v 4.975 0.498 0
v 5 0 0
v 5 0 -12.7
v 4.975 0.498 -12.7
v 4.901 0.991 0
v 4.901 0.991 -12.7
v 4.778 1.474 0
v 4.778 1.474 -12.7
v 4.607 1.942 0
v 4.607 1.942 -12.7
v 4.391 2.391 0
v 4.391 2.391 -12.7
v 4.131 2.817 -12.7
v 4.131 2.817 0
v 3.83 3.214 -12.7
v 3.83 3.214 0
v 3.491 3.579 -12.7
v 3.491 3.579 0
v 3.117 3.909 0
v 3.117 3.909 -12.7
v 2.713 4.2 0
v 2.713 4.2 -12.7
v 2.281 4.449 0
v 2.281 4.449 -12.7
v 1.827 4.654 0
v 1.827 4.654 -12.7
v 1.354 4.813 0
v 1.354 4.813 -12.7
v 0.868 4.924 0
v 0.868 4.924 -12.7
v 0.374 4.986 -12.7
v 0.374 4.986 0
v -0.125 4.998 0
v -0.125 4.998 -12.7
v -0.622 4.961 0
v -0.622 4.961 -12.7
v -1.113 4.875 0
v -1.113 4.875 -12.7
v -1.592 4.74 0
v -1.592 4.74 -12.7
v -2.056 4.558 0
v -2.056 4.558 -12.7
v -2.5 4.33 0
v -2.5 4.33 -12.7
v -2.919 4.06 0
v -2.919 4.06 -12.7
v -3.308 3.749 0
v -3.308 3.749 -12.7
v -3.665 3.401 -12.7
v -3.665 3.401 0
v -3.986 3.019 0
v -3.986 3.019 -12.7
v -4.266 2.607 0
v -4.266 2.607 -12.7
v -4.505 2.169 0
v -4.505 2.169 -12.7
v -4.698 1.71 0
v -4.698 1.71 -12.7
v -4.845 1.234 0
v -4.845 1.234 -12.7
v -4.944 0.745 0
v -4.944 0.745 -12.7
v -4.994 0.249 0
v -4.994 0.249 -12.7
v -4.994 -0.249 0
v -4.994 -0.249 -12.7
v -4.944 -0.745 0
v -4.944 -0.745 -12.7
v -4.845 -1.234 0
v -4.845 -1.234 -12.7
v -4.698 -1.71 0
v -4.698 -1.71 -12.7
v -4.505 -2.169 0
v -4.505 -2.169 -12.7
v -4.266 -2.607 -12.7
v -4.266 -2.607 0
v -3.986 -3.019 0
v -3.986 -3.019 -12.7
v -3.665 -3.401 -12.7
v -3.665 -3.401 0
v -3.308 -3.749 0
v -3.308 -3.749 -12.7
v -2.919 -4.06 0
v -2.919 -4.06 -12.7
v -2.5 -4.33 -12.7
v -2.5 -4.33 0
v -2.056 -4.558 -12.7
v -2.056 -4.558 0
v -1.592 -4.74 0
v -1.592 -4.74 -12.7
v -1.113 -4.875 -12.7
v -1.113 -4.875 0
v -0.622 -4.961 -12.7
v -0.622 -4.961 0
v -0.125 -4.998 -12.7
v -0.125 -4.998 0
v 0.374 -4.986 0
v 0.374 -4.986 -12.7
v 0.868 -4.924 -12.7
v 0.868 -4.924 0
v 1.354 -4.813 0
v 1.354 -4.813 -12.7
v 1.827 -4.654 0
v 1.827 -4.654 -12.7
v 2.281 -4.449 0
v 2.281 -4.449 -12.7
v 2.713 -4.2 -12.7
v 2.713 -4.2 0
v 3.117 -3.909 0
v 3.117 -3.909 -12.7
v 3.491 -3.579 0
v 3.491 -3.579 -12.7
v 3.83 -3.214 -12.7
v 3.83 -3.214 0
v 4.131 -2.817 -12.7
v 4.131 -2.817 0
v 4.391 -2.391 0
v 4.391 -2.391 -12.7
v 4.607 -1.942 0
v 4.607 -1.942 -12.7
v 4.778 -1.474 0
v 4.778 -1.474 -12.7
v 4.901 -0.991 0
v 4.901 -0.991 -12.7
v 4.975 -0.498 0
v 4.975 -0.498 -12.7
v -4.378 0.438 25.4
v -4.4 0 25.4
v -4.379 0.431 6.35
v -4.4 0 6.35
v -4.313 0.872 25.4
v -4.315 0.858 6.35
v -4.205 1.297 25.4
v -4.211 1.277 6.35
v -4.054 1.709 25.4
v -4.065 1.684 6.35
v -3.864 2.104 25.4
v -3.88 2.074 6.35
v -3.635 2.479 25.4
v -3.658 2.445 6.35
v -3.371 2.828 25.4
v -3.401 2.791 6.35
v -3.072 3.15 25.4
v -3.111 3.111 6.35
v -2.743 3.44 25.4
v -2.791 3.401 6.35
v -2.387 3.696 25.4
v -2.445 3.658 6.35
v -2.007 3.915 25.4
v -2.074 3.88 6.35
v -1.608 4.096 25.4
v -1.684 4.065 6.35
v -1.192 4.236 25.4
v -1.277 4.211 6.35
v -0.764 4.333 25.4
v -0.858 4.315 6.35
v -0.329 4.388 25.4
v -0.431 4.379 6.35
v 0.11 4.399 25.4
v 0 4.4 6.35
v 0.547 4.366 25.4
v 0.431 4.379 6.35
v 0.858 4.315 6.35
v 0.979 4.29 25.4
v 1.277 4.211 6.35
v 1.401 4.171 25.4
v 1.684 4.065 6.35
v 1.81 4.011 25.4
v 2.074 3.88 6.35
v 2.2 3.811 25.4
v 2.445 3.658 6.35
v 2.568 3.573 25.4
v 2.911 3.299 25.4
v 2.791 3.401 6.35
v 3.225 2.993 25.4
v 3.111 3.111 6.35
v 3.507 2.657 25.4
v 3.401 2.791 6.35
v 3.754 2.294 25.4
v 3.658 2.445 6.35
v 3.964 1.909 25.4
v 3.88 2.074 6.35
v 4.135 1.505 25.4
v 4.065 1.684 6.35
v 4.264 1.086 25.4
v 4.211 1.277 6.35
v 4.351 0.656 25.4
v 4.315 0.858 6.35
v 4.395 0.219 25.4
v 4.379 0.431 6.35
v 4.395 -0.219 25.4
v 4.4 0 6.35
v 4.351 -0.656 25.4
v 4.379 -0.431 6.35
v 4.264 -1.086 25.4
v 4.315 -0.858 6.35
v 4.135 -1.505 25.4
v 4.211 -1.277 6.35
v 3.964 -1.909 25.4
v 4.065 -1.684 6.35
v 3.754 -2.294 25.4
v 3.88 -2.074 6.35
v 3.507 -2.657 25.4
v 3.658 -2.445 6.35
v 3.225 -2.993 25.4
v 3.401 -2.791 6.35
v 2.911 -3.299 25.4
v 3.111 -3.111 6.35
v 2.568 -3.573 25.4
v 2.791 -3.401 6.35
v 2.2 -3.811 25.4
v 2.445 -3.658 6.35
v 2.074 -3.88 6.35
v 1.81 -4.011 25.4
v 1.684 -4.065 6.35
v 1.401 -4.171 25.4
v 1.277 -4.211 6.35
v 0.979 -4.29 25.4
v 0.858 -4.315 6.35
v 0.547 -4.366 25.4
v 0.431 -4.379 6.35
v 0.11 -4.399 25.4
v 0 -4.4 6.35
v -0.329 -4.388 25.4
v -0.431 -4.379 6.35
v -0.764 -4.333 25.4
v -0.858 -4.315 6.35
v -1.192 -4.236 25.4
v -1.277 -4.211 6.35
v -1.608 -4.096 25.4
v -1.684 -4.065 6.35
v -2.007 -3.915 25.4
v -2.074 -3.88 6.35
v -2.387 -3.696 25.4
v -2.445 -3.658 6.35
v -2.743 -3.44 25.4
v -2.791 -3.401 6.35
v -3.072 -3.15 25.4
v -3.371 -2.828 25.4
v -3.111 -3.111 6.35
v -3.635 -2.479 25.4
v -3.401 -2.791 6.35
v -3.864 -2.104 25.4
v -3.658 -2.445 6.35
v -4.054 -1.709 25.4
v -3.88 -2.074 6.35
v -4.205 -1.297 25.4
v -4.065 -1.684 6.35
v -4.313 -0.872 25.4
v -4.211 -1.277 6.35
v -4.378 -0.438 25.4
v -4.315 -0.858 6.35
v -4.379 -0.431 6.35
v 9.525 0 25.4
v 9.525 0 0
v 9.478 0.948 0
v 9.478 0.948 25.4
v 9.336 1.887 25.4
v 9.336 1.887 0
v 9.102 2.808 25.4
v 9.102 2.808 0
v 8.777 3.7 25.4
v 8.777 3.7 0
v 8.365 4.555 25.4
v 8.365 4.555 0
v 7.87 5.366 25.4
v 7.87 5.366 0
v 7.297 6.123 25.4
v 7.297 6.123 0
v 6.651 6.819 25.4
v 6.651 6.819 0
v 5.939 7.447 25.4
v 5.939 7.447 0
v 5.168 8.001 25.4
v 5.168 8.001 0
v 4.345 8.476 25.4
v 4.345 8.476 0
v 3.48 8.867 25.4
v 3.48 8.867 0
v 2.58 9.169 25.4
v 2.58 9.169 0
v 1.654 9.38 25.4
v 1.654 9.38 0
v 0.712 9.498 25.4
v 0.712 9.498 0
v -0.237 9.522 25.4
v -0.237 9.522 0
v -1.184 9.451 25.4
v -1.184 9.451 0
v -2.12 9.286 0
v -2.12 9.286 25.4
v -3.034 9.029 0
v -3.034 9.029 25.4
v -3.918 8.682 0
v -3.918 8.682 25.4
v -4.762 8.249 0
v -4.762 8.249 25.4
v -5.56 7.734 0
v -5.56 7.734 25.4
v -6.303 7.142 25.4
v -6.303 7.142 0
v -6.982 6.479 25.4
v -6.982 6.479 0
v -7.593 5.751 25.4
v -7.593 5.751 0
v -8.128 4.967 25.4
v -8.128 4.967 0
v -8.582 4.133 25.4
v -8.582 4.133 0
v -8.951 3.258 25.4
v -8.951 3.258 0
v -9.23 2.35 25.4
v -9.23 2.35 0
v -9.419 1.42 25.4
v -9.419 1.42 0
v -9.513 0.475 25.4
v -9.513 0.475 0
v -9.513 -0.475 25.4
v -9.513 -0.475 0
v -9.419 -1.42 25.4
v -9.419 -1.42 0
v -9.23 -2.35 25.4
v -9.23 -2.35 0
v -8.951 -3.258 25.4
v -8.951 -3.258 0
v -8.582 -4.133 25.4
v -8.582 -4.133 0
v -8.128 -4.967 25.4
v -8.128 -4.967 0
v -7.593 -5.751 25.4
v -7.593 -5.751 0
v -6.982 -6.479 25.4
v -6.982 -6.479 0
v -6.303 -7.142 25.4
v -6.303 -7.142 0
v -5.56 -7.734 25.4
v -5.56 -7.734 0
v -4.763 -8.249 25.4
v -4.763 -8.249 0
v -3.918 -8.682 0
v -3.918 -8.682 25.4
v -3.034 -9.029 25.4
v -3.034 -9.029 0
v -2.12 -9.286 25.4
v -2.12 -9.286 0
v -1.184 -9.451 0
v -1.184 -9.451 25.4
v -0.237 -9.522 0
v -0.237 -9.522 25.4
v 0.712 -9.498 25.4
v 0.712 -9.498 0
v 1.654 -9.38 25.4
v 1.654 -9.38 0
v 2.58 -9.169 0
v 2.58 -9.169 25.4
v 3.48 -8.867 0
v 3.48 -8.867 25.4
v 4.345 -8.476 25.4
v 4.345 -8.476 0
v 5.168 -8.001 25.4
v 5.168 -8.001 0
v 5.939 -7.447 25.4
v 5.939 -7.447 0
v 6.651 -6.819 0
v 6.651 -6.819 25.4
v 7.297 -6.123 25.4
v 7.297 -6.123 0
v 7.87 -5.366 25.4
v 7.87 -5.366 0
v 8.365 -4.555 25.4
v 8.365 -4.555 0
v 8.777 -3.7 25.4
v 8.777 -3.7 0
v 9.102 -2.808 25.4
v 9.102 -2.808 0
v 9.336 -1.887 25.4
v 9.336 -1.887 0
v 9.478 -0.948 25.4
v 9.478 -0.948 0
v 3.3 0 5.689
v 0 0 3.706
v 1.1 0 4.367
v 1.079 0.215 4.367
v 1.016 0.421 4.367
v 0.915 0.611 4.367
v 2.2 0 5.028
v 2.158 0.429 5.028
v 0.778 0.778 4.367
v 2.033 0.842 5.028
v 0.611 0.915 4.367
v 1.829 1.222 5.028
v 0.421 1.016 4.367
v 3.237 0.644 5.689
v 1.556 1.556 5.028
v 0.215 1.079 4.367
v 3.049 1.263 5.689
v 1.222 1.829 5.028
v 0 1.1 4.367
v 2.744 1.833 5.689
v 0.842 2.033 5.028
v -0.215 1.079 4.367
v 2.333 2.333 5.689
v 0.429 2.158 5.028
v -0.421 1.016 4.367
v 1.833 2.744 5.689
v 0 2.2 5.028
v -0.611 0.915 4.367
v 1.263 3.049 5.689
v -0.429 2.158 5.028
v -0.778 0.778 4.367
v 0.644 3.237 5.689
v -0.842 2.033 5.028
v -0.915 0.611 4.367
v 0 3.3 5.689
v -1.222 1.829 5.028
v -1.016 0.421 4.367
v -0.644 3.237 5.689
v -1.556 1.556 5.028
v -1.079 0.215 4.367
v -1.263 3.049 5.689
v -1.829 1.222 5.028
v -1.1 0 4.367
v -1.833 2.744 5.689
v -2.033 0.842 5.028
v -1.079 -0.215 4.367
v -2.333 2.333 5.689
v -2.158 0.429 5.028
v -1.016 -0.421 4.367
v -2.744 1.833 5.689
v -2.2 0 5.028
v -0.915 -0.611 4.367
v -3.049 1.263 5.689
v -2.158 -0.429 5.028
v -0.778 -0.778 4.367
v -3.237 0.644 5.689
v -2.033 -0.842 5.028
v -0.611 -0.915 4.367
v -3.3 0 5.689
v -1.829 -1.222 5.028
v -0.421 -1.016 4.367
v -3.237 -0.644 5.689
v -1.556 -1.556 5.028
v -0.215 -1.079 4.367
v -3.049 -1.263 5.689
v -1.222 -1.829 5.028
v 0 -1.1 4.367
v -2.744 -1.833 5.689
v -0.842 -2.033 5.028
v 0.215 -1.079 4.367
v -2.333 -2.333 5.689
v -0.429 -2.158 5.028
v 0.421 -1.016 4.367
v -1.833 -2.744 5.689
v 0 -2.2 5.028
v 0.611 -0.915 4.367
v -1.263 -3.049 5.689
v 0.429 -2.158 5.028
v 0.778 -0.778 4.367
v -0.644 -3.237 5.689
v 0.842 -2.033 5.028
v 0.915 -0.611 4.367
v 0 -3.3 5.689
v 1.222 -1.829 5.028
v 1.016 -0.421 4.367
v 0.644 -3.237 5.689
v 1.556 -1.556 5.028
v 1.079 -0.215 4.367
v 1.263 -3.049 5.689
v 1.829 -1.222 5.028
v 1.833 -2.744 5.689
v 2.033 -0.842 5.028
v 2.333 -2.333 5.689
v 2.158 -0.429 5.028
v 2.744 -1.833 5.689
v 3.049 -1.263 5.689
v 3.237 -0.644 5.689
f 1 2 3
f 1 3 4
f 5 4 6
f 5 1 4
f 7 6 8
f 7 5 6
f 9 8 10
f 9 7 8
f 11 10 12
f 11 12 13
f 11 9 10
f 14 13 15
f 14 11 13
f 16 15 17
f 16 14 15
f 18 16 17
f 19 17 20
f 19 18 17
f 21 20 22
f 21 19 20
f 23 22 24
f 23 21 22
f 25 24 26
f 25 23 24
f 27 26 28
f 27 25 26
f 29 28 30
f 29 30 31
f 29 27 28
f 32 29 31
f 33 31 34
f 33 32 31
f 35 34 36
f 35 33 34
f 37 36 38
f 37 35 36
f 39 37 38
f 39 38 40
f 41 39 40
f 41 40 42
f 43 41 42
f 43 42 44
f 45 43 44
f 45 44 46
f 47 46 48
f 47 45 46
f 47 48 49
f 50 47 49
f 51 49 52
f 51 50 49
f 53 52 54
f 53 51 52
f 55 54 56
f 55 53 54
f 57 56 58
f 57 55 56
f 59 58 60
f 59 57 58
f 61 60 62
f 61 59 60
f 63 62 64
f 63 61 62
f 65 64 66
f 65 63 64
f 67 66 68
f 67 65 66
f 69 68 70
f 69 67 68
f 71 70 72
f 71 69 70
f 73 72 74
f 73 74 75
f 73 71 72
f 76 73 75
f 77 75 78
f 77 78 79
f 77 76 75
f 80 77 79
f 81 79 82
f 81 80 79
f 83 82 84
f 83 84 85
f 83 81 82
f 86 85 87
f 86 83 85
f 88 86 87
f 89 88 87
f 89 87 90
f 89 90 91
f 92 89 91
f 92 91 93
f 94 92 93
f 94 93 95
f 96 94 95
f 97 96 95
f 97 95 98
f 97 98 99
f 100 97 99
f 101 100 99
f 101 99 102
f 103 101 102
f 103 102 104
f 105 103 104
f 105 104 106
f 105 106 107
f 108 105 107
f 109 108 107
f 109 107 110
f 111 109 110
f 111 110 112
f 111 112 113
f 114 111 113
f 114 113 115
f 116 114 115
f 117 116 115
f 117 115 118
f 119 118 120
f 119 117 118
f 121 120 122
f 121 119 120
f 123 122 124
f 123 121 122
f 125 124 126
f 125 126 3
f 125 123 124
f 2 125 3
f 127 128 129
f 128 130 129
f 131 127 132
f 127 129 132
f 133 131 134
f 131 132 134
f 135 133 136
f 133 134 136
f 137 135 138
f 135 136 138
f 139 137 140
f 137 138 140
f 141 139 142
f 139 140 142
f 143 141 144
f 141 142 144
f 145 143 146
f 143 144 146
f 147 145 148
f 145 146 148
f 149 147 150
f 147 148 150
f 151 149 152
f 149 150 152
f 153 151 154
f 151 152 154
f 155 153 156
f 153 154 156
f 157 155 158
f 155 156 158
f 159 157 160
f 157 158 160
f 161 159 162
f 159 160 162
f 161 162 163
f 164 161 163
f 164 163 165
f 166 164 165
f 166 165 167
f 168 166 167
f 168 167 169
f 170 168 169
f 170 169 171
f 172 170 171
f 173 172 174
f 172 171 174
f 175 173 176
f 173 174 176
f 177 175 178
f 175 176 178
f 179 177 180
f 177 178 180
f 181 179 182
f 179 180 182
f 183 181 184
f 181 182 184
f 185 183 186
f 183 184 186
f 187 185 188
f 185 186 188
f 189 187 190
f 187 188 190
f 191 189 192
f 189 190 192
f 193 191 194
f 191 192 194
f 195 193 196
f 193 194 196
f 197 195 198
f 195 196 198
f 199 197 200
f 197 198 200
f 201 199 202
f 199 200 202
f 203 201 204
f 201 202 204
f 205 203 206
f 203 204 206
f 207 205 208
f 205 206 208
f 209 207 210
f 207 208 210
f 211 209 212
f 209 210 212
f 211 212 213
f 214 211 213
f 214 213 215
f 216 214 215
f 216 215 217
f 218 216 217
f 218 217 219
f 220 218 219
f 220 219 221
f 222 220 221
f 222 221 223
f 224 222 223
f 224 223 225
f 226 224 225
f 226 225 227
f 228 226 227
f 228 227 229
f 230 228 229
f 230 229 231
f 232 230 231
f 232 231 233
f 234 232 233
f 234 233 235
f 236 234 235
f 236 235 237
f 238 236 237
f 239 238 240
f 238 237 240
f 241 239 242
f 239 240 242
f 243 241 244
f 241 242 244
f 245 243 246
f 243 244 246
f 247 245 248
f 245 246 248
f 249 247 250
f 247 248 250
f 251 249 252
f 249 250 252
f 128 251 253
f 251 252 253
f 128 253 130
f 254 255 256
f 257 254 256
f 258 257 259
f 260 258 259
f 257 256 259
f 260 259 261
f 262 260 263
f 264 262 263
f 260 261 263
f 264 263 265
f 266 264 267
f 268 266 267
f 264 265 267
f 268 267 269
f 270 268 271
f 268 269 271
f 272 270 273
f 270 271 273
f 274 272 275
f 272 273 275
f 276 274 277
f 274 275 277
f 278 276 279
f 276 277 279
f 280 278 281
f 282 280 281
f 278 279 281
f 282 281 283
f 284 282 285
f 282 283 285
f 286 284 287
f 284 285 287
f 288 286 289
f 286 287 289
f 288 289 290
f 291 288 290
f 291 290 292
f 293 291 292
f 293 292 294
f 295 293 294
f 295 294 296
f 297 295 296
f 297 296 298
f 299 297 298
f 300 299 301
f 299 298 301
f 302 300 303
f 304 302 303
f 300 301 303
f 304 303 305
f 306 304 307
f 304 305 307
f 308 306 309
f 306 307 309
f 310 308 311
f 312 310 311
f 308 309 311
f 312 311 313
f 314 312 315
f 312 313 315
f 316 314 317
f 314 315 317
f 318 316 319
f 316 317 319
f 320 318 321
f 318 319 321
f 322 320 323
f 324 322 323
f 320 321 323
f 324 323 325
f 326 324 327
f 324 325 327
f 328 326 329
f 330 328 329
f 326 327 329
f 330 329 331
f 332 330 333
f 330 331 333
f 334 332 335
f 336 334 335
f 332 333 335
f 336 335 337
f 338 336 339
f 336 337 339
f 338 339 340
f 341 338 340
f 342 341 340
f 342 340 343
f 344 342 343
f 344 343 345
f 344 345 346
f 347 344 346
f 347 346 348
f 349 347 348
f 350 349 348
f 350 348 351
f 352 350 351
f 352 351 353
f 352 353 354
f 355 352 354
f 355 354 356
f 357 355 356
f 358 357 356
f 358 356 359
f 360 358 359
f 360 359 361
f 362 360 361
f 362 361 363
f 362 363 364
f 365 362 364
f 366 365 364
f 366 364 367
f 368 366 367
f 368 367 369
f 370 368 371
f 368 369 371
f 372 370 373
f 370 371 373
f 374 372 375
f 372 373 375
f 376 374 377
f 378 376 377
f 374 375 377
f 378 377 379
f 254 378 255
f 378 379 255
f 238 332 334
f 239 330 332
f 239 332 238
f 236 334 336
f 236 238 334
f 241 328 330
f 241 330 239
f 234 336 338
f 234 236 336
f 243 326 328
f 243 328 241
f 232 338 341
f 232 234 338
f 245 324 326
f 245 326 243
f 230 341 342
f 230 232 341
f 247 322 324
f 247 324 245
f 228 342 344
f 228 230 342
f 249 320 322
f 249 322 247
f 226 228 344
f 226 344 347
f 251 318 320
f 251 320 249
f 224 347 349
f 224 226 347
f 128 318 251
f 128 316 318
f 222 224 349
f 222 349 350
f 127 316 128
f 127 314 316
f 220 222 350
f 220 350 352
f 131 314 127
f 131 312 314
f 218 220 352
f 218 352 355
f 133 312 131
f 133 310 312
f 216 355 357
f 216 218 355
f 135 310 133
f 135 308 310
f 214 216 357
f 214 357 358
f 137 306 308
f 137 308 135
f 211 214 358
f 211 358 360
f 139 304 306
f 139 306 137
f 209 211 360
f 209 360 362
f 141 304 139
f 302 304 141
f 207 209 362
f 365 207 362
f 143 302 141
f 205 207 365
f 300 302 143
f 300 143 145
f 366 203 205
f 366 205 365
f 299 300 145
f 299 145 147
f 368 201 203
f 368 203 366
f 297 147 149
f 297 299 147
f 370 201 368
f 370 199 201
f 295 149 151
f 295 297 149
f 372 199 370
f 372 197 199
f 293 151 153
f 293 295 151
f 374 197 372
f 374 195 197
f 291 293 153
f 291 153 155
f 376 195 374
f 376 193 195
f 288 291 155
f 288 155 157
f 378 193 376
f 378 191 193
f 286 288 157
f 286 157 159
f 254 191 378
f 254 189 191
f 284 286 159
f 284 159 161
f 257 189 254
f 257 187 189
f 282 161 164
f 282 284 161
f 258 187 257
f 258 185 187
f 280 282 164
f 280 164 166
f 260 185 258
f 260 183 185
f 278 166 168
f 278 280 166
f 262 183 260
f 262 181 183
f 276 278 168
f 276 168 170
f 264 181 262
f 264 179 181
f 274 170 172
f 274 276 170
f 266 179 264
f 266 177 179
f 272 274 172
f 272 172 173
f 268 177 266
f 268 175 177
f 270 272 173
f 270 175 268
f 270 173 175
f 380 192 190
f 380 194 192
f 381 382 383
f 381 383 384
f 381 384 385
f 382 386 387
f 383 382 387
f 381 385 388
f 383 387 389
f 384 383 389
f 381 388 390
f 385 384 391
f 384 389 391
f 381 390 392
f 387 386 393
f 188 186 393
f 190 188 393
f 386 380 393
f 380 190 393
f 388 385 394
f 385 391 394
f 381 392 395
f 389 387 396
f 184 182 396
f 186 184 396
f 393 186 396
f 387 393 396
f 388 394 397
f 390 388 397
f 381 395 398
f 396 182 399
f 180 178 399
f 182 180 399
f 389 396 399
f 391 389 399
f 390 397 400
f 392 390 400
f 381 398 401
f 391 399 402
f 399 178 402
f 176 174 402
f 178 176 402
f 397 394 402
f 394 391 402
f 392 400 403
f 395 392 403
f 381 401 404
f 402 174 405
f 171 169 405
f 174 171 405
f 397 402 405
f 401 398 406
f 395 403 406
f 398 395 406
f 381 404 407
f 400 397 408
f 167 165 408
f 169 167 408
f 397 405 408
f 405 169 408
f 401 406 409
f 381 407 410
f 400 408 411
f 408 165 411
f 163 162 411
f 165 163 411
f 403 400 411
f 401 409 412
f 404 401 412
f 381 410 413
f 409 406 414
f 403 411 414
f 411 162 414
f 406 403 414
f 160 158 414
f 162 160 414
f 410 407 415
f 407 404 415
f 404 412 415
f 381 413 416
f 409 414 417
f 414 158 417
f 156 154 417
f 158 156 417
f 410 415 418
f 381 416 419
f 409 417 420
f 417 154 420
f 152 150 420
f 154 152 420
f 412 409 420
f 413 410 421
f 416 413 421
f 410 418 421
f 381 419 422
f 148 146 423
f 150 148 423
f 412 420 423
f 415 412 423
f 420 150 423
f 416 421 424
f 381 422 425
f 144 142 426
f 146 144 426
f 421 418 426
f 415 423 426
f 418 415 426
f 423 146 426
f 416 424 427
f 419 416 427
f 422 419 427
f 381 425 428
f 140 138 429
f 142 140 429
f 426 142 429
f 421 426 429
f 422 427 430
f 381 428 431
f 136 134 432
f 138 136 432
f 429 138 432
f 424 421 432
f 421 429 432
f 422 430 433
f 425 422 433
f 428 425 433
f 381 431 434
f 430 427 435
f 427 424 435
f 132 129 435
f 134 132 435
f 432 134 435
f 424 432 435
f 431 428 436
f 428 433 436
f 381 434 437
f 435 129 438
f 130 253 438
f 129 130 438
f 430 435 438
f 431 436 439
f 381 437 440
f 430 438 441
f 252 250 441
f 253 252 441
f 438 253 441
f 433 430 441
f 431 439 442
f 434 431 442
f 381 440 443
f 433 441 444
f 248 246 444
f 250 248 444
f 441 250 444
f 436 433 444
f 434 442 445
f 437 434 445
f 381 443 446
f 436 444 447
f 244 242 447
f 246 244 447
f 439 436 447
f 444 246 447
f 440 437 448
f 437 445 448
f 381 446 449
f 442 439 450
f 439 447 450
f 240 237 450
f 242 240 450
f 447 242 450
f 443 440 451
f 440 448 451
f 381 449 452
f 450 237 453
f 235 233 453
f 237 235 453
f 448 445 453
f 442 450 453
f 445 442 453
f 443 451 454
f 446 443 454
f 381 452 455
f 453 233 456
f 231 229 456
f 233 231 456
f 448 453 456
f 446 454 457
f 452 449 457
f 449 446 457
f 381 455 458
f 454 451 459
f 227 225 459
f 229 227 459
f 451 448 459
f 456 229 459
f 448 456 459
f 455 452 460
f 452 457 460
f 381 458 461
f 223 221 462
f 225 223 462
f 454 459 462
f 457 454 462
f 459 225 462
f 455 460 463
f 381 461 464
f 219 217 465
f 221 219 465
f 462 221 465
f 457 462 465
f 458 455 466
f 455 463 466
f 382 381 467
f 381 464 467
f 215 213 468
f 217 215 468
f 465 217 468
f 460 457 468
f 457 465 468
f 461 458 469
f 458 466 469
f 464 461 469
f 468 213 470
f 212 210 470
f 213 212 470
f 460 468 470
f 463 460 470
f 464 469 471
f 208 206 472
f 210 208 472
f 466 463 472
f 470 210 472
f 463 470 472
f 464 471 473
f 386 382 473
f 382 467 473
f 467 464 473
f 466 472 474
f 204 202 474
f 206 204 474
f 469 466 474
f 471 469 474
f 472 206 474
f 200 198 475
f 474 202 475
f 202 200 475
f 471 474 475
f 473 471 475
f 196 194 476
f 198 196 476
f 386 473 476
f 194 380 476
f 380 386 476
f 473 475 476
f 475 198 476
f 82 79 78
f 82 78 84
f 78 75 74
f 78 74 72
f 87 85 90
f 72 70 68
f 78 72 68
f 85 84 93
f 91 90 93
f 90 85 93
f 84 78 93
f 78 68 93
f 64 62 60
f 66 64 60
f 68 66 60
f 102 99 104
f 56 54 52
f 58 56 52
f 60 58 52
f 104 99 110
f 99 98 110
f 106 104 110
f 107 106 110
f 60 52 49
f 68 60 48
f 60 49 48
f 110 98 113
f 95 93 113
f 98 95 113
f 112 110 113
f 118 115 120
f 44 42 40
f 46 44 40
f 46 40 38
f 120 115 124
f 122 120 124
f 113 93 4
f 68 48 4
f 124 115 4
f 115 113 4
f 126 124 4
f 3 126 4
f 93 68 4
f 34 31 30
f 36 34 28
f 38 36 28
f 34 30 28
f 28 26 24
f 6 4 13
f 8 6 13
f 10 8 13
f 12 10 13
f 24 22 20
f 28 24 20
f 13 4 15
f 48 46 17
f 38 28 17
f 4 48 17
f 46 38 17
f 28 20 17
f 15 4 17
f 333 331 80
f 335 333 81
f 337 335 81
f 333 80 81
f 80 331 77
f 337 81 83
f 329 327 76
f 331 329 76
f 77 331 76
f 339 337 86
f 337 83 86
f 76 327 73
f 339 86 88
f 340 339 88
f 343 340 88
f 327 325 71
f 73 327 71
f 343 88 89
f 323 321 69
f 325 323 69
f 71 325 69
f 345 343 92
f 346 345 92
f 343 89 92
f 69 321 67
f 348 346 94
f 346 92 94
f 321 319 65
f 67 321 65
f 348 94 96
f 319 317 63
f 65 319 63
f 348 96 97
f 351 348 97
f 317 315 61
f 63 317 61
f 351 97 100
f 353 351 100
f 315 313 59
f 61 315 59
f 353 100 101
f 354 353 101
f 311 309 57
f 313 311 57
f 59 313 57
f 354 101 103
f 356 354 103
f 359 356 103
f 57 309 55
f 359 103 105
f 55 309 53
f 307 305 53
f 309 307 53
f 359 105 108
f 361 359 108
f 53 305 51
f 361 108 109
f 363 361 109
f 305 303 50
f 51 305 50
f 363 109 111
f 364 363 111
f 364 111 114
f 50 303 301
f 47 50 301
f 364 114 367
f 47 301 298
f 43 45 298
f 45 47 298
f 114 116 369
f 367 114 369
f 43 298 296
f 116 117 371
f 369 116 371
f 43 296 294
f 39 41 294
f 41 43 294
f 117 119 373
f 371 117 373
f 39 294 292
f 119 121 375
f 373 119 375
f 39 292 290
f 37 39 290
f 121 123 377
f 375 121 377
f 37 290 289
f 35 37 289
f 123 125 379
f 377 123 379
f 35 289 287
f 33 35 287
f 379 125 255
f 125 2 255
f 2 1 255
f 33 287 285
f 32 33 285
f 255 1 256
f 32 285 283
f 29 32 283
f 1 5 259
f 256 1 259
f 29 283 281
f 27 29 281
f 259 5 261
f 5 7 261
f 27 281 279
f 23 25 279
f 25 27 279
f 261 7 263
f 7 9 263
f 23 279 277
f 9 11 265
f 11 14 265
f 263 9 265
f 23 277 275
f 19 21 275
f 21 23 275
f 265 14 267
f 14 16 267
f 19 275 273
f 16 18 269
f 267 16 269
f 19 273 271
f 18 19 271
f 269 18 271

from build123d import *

# Parameters (mm, degrees)
F0_R     = 9.525
F0_R_2   = 5
F1_DEPTH = 25.4
F2_DEPTH = 12.7
F4_D     = 8.8
F4_DEPTH = 19.05
F4_TIP   = 2.6437867237


with BuildPart() as f1:
    # F0 (on Top) → F1 (new body)
    with BuildSketch(Plane.XY):
        Circle(F0_R)
        Circle(F0_R_2, mode=Mode.SUBTRACT)
        Circle(F0_R_2)
    extrude(amount=F1_DEPTH)

    # F0 (on Top) → F2 (join)
    with BuildSketch(Plane.XY):
        Circle(F0_R_2)
    extrude(amount=-F2_DEPTH)

    # F4
    with Locations(Plane.XY.offset(25.4)):
        with Locations((0, 0)):
            Hole(F4_D / 2, depth=F4_DEPTH)
            with Locations((0, 0, -(F4_DEPTH + F4_TIP / 2))):  # 118° drill point
                Cone(0, F4_D / 2, F4_TIP, mode=Mode.SUBTRACT)


solid = f1.part
